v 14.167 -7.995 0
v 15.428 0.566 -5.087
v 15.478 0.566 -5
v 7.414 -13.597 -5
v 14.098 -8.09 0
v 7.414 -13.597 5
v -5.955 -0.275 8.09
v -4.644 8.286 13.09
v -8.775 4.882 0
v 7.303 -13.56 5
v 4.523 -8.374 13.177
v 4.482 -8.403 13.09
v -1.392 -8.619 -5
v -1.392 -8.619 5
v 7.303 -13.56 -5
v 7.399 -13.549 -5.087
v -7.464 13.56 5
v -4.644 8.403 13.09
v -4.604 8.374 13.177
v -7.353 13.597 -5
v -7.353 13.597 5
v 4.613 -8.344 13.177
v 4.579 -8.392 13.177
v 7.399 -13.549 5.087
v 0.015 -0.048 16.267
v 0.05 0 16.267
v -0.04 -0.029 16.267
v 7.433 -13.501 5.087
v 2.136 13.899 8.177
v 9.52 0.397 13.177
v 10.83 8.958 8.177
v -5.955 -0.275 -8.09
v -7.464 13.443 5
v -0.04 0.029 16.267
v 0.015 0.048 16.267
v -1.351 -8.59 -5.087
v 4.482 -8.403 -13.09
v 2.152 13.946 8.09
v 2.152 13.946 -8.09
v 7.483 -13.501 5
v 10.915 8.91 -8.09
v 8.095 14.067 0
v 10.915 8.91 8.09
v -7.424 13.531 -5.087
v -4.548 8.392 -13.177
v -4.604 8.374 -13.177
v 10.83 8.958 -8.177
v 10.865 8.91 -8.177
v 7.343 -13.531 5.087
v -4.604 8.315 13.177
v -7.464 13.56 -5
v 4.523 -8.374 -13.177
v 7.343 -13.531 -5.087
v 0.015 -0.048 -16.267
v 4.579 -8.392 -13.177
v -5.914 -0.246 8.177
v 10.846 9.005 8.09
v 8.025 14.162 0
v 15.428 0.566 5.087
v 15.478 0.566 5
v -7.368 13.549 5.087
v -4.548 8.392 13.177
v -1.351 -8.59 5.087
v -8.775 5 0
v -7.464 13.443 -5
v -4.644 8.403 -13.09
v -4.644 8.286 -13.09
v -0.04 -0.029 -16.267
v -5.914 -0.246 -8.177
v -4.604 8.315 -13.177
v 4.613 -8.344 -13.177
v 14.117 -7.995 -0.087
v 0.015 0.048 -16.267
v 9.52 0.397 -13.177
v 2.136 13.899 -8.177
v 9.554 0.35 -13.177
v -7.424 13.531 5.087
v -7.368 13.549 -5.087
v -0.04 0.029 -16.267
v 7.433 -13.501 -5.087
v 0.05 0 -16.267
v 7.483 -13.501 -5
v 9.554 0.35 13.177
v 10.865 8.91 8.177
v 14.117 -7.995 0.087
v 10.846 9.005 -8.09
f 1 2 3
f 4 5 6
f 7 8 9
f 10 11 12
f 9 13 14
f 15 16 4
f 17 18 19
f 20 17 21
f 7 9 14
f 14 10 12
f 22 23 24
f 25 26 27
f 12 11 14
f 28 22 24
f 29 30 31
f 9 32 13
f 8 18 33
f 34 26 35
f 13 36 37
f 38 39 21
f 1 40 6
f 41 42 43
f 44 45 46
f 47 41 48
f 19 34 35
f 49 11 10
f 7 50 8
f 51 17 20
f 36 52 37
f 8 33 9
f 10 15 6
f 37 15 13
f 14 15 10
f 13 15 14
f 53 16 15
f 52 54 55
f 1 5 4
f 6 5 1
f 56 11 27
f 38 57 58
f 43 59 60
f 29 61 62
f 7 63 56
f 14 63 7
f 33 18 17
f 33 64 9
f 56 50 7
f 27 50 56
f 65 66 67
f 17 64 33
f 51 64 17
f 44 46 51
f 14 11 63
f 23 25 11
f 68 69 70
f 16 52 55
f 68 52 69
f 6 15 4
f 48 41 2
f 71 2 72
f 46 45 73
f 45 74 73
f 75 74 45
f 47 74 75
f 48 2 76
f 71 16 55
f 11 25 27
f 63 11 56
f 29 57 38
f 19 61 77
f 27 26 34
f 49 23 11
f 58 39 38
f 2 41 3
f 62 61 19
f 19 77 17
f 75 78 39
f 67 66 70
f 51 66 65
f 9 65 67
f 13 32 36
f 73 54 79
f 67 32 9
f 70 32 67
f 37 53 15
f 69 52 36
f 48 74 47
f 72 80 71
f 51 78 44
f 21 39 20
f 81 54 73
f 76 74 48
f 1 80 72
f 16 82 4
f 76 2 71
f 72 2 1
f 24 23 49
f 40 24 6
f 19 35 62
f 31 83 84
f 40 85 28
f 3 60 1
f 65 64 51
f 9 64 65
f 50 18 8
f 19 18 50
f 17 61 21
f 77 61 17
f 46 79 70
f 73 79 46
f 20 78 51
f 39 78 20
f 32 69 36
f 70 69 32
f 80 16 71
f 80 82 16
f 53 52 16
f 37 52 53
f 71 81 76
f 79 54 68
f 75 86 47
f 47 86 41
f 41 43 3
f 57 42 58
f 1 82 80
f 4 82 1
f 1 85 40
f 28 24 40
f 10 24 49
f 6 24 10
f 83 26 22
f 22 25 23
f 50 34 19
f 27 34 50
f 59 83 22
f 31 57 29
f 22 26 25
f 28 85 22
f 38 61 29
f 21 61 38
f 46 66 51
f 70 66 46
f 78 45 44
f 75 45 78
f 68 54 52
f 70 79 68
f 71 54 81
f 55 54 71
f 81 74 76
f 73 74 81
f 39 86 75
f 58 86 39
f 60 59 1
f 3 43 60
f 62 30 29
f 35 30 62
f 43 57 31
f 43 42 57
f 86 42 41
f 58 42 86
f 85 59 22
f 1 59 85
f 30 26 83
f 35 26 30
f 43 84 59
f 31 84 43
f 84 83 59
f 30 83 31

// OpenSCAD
// Auto-generated OpenSCAD file

    inner_points = 10*[[3.624317002584078e-13, 2.953319001906976e-13, 1.618033988749895], [-3.624317002584078e-13, -2.953319001906976e-13, -1.618033988749895], [1.4067368092917045, -0.799453274515584, -1.6918183476653185e-13], [0.799453274515584, 1.4067368092917045, -4.358384739871853e-13], [-0.4563237566115435, 0.834432217941957, 1.3090169943748973], [-0.45632375661213, 0.8344322179414793, -1.3090169943749976], [0.45632375661213, -0.8344322179414793, 1.3090169943749976], [0.4563237566115435, -0.834432217941957, -1.3090169943748973], [0.9504130526801611, 0.03497894342637298, 1.309016994374728], [0.9504130526795745, 0.03497894342589519, -1.3090169943751668], [-0.7383473480718745, 1.350139689937751, 0.49999999999991895], [-0.7383473480720981, 1.3501396899375684, -0.500000000000081], [0.7383473480720981, -1.3501396899375684, 0.500000000000081], [0.7383473480718745, -1.350139689937751, -0.49999999999991895], [1.5378006225876821, 0.056597119354135916, 0.4999999999996452], [1.5378006225874585, 0.056597119353953396, -0.5000000000003548], [0.21206570460806262, 1.3851186333639414, 0.8090169943746471], [0.21206570460770024, 1.3851186333636463, -0.8090169943752478], [1.0814768659759149, 0.8910293372959104, 0.8090169943745426], [1.0814768659755525, 0.8910293372956152, -0.8090169943753523], [-0.8694111613678522, 0.49408929606803104, 1.0456012416478531e-13], [-0.5873875699075214, -0.02161817592776291, 0.809016994375083], [-0.5873875699078839, -0.021618175928058286, -0.8090169943748119], [-0.13106381329575384, -0.8560503938695374, 0.5000000000001856], [-0.13106381329597788, -0.8560503938697199, -0.49999999999981437]];

    outer_points = 10*[[-0.4827045868491299, -0.5943615441771533, -1.4253998124694895], [0.4827045868491299, 0.5943615441771533, 1.4253998124694895], [1.5325422089871936, 0.0, -0.5189878287807413], [0.19064272411334998, -1.5049147296618652, 0.56295736689317], [-1.097875476912321, -0.9458928165929492, -0.7197153641977476], [-0.31684304886495324, 0.01580436349155695, 1.5866299799356127], [0.31684304886495324, -0.01580436349155695, -1.5866299799356127], [1.097875476912321, 0.9458928165929492, 0.7197153641977476], [0.43466673207487266, -0.9458928165929492, -1.2387031929784889], [1.2156991601222404, 0.01580436349155695, 1.0676421511548713], [-1.2936952502100056, -0.9361251827846091, 0.2608758909720249], [-0.9953674090117679, -0.5687895468772561, 1.1418214226358954], [0.9953674090117679, 0.5687895468772561, -1.1418214226358954], [1.2936952502100056, 0.9361251827846091, -0.2608758909720249], [1.186010133125118, -0.9361251827846091, -0.5788640557427255], [1.4843379743233558, -0.5687895468772561, 0.3020814759211451], [-0.5607006769368953, -1.5146823634702054, -0.09688177034259327], [-0.07799609008776537, -0.9203208192930521, 1.3285180421268963], [0.38646249741103483, -1.5146823634702054, -0.4176338882766023], [0.8691670842601649, -0.9203208192930521, 1.0077659241928874], [-0.9471631743479302, 0.0, 0.32075211793400904], [-0.7513434010502453, -0.009767633808340115, -0.6598391372357633], [-0.26863881420111535, 0.5845939103688131, 0.7655606752337263], [0.04820423466383783, 0.5687895468772561, -0.8210693047018864], [0.34653207586207563, 0.9361251827846091, 0.059876226961984164]];

    // Convex hull for inner set (I)
    module inner_hull() {
        hull() {
            for (p = inner_points) {
                translate(p) sphere(r=0.1);
            }
        }
    }

    // Convex hull for outer set (O) minus inner hull (O \ I)
    module outer_minus_inner() {
        difference() {
            hull() {
                for (p = outer_points) {
                    translate(p) sphere(r=0.1);
                }
            }
            inner_hull(); // Subtract inner hull
        }
    }

    // Convex hull for outer set (O) minus all translated inner hulls
    module outer_minus_AllTranslationInner() {
        difference() {
            hull() {
                for (p = outer_points) {
                    translate(p) sphere(r=0.1);
                }
            }
            hull() {
                translate([0,0,50]) inner_hull();
                translate([0,0,-50]) inner_hull();
            }; // Subtract translated inner hulls
        }
    }

    // Difference between outer_minus_inner and outer_minus_AllTranslationInner
    module outer_minus_inner_diff() {
        difference() {
            // Outer minus inner
            difference() {
                hull() {
                    for (p = outer_points) {
                        translate(p) sphere(r=0.1);
                    }
                }
                inner_hull();
            }

            // Subtract Outer minus AllTranslationInner
            difference() {
                hull() {
                    for (p = outer_points) {
                        translate(p) sphere(r=0.1);
                    }
                }
                hull() {
                    translate([0,0,50]) inner_hull();
                    translate([0,0,-50]) inner_hull();
                };
            }
        }
    }

    // Rendering all with colors applied
    color([1, 0, 0, 0.5]) inner_hull(); // Transparent red
    
